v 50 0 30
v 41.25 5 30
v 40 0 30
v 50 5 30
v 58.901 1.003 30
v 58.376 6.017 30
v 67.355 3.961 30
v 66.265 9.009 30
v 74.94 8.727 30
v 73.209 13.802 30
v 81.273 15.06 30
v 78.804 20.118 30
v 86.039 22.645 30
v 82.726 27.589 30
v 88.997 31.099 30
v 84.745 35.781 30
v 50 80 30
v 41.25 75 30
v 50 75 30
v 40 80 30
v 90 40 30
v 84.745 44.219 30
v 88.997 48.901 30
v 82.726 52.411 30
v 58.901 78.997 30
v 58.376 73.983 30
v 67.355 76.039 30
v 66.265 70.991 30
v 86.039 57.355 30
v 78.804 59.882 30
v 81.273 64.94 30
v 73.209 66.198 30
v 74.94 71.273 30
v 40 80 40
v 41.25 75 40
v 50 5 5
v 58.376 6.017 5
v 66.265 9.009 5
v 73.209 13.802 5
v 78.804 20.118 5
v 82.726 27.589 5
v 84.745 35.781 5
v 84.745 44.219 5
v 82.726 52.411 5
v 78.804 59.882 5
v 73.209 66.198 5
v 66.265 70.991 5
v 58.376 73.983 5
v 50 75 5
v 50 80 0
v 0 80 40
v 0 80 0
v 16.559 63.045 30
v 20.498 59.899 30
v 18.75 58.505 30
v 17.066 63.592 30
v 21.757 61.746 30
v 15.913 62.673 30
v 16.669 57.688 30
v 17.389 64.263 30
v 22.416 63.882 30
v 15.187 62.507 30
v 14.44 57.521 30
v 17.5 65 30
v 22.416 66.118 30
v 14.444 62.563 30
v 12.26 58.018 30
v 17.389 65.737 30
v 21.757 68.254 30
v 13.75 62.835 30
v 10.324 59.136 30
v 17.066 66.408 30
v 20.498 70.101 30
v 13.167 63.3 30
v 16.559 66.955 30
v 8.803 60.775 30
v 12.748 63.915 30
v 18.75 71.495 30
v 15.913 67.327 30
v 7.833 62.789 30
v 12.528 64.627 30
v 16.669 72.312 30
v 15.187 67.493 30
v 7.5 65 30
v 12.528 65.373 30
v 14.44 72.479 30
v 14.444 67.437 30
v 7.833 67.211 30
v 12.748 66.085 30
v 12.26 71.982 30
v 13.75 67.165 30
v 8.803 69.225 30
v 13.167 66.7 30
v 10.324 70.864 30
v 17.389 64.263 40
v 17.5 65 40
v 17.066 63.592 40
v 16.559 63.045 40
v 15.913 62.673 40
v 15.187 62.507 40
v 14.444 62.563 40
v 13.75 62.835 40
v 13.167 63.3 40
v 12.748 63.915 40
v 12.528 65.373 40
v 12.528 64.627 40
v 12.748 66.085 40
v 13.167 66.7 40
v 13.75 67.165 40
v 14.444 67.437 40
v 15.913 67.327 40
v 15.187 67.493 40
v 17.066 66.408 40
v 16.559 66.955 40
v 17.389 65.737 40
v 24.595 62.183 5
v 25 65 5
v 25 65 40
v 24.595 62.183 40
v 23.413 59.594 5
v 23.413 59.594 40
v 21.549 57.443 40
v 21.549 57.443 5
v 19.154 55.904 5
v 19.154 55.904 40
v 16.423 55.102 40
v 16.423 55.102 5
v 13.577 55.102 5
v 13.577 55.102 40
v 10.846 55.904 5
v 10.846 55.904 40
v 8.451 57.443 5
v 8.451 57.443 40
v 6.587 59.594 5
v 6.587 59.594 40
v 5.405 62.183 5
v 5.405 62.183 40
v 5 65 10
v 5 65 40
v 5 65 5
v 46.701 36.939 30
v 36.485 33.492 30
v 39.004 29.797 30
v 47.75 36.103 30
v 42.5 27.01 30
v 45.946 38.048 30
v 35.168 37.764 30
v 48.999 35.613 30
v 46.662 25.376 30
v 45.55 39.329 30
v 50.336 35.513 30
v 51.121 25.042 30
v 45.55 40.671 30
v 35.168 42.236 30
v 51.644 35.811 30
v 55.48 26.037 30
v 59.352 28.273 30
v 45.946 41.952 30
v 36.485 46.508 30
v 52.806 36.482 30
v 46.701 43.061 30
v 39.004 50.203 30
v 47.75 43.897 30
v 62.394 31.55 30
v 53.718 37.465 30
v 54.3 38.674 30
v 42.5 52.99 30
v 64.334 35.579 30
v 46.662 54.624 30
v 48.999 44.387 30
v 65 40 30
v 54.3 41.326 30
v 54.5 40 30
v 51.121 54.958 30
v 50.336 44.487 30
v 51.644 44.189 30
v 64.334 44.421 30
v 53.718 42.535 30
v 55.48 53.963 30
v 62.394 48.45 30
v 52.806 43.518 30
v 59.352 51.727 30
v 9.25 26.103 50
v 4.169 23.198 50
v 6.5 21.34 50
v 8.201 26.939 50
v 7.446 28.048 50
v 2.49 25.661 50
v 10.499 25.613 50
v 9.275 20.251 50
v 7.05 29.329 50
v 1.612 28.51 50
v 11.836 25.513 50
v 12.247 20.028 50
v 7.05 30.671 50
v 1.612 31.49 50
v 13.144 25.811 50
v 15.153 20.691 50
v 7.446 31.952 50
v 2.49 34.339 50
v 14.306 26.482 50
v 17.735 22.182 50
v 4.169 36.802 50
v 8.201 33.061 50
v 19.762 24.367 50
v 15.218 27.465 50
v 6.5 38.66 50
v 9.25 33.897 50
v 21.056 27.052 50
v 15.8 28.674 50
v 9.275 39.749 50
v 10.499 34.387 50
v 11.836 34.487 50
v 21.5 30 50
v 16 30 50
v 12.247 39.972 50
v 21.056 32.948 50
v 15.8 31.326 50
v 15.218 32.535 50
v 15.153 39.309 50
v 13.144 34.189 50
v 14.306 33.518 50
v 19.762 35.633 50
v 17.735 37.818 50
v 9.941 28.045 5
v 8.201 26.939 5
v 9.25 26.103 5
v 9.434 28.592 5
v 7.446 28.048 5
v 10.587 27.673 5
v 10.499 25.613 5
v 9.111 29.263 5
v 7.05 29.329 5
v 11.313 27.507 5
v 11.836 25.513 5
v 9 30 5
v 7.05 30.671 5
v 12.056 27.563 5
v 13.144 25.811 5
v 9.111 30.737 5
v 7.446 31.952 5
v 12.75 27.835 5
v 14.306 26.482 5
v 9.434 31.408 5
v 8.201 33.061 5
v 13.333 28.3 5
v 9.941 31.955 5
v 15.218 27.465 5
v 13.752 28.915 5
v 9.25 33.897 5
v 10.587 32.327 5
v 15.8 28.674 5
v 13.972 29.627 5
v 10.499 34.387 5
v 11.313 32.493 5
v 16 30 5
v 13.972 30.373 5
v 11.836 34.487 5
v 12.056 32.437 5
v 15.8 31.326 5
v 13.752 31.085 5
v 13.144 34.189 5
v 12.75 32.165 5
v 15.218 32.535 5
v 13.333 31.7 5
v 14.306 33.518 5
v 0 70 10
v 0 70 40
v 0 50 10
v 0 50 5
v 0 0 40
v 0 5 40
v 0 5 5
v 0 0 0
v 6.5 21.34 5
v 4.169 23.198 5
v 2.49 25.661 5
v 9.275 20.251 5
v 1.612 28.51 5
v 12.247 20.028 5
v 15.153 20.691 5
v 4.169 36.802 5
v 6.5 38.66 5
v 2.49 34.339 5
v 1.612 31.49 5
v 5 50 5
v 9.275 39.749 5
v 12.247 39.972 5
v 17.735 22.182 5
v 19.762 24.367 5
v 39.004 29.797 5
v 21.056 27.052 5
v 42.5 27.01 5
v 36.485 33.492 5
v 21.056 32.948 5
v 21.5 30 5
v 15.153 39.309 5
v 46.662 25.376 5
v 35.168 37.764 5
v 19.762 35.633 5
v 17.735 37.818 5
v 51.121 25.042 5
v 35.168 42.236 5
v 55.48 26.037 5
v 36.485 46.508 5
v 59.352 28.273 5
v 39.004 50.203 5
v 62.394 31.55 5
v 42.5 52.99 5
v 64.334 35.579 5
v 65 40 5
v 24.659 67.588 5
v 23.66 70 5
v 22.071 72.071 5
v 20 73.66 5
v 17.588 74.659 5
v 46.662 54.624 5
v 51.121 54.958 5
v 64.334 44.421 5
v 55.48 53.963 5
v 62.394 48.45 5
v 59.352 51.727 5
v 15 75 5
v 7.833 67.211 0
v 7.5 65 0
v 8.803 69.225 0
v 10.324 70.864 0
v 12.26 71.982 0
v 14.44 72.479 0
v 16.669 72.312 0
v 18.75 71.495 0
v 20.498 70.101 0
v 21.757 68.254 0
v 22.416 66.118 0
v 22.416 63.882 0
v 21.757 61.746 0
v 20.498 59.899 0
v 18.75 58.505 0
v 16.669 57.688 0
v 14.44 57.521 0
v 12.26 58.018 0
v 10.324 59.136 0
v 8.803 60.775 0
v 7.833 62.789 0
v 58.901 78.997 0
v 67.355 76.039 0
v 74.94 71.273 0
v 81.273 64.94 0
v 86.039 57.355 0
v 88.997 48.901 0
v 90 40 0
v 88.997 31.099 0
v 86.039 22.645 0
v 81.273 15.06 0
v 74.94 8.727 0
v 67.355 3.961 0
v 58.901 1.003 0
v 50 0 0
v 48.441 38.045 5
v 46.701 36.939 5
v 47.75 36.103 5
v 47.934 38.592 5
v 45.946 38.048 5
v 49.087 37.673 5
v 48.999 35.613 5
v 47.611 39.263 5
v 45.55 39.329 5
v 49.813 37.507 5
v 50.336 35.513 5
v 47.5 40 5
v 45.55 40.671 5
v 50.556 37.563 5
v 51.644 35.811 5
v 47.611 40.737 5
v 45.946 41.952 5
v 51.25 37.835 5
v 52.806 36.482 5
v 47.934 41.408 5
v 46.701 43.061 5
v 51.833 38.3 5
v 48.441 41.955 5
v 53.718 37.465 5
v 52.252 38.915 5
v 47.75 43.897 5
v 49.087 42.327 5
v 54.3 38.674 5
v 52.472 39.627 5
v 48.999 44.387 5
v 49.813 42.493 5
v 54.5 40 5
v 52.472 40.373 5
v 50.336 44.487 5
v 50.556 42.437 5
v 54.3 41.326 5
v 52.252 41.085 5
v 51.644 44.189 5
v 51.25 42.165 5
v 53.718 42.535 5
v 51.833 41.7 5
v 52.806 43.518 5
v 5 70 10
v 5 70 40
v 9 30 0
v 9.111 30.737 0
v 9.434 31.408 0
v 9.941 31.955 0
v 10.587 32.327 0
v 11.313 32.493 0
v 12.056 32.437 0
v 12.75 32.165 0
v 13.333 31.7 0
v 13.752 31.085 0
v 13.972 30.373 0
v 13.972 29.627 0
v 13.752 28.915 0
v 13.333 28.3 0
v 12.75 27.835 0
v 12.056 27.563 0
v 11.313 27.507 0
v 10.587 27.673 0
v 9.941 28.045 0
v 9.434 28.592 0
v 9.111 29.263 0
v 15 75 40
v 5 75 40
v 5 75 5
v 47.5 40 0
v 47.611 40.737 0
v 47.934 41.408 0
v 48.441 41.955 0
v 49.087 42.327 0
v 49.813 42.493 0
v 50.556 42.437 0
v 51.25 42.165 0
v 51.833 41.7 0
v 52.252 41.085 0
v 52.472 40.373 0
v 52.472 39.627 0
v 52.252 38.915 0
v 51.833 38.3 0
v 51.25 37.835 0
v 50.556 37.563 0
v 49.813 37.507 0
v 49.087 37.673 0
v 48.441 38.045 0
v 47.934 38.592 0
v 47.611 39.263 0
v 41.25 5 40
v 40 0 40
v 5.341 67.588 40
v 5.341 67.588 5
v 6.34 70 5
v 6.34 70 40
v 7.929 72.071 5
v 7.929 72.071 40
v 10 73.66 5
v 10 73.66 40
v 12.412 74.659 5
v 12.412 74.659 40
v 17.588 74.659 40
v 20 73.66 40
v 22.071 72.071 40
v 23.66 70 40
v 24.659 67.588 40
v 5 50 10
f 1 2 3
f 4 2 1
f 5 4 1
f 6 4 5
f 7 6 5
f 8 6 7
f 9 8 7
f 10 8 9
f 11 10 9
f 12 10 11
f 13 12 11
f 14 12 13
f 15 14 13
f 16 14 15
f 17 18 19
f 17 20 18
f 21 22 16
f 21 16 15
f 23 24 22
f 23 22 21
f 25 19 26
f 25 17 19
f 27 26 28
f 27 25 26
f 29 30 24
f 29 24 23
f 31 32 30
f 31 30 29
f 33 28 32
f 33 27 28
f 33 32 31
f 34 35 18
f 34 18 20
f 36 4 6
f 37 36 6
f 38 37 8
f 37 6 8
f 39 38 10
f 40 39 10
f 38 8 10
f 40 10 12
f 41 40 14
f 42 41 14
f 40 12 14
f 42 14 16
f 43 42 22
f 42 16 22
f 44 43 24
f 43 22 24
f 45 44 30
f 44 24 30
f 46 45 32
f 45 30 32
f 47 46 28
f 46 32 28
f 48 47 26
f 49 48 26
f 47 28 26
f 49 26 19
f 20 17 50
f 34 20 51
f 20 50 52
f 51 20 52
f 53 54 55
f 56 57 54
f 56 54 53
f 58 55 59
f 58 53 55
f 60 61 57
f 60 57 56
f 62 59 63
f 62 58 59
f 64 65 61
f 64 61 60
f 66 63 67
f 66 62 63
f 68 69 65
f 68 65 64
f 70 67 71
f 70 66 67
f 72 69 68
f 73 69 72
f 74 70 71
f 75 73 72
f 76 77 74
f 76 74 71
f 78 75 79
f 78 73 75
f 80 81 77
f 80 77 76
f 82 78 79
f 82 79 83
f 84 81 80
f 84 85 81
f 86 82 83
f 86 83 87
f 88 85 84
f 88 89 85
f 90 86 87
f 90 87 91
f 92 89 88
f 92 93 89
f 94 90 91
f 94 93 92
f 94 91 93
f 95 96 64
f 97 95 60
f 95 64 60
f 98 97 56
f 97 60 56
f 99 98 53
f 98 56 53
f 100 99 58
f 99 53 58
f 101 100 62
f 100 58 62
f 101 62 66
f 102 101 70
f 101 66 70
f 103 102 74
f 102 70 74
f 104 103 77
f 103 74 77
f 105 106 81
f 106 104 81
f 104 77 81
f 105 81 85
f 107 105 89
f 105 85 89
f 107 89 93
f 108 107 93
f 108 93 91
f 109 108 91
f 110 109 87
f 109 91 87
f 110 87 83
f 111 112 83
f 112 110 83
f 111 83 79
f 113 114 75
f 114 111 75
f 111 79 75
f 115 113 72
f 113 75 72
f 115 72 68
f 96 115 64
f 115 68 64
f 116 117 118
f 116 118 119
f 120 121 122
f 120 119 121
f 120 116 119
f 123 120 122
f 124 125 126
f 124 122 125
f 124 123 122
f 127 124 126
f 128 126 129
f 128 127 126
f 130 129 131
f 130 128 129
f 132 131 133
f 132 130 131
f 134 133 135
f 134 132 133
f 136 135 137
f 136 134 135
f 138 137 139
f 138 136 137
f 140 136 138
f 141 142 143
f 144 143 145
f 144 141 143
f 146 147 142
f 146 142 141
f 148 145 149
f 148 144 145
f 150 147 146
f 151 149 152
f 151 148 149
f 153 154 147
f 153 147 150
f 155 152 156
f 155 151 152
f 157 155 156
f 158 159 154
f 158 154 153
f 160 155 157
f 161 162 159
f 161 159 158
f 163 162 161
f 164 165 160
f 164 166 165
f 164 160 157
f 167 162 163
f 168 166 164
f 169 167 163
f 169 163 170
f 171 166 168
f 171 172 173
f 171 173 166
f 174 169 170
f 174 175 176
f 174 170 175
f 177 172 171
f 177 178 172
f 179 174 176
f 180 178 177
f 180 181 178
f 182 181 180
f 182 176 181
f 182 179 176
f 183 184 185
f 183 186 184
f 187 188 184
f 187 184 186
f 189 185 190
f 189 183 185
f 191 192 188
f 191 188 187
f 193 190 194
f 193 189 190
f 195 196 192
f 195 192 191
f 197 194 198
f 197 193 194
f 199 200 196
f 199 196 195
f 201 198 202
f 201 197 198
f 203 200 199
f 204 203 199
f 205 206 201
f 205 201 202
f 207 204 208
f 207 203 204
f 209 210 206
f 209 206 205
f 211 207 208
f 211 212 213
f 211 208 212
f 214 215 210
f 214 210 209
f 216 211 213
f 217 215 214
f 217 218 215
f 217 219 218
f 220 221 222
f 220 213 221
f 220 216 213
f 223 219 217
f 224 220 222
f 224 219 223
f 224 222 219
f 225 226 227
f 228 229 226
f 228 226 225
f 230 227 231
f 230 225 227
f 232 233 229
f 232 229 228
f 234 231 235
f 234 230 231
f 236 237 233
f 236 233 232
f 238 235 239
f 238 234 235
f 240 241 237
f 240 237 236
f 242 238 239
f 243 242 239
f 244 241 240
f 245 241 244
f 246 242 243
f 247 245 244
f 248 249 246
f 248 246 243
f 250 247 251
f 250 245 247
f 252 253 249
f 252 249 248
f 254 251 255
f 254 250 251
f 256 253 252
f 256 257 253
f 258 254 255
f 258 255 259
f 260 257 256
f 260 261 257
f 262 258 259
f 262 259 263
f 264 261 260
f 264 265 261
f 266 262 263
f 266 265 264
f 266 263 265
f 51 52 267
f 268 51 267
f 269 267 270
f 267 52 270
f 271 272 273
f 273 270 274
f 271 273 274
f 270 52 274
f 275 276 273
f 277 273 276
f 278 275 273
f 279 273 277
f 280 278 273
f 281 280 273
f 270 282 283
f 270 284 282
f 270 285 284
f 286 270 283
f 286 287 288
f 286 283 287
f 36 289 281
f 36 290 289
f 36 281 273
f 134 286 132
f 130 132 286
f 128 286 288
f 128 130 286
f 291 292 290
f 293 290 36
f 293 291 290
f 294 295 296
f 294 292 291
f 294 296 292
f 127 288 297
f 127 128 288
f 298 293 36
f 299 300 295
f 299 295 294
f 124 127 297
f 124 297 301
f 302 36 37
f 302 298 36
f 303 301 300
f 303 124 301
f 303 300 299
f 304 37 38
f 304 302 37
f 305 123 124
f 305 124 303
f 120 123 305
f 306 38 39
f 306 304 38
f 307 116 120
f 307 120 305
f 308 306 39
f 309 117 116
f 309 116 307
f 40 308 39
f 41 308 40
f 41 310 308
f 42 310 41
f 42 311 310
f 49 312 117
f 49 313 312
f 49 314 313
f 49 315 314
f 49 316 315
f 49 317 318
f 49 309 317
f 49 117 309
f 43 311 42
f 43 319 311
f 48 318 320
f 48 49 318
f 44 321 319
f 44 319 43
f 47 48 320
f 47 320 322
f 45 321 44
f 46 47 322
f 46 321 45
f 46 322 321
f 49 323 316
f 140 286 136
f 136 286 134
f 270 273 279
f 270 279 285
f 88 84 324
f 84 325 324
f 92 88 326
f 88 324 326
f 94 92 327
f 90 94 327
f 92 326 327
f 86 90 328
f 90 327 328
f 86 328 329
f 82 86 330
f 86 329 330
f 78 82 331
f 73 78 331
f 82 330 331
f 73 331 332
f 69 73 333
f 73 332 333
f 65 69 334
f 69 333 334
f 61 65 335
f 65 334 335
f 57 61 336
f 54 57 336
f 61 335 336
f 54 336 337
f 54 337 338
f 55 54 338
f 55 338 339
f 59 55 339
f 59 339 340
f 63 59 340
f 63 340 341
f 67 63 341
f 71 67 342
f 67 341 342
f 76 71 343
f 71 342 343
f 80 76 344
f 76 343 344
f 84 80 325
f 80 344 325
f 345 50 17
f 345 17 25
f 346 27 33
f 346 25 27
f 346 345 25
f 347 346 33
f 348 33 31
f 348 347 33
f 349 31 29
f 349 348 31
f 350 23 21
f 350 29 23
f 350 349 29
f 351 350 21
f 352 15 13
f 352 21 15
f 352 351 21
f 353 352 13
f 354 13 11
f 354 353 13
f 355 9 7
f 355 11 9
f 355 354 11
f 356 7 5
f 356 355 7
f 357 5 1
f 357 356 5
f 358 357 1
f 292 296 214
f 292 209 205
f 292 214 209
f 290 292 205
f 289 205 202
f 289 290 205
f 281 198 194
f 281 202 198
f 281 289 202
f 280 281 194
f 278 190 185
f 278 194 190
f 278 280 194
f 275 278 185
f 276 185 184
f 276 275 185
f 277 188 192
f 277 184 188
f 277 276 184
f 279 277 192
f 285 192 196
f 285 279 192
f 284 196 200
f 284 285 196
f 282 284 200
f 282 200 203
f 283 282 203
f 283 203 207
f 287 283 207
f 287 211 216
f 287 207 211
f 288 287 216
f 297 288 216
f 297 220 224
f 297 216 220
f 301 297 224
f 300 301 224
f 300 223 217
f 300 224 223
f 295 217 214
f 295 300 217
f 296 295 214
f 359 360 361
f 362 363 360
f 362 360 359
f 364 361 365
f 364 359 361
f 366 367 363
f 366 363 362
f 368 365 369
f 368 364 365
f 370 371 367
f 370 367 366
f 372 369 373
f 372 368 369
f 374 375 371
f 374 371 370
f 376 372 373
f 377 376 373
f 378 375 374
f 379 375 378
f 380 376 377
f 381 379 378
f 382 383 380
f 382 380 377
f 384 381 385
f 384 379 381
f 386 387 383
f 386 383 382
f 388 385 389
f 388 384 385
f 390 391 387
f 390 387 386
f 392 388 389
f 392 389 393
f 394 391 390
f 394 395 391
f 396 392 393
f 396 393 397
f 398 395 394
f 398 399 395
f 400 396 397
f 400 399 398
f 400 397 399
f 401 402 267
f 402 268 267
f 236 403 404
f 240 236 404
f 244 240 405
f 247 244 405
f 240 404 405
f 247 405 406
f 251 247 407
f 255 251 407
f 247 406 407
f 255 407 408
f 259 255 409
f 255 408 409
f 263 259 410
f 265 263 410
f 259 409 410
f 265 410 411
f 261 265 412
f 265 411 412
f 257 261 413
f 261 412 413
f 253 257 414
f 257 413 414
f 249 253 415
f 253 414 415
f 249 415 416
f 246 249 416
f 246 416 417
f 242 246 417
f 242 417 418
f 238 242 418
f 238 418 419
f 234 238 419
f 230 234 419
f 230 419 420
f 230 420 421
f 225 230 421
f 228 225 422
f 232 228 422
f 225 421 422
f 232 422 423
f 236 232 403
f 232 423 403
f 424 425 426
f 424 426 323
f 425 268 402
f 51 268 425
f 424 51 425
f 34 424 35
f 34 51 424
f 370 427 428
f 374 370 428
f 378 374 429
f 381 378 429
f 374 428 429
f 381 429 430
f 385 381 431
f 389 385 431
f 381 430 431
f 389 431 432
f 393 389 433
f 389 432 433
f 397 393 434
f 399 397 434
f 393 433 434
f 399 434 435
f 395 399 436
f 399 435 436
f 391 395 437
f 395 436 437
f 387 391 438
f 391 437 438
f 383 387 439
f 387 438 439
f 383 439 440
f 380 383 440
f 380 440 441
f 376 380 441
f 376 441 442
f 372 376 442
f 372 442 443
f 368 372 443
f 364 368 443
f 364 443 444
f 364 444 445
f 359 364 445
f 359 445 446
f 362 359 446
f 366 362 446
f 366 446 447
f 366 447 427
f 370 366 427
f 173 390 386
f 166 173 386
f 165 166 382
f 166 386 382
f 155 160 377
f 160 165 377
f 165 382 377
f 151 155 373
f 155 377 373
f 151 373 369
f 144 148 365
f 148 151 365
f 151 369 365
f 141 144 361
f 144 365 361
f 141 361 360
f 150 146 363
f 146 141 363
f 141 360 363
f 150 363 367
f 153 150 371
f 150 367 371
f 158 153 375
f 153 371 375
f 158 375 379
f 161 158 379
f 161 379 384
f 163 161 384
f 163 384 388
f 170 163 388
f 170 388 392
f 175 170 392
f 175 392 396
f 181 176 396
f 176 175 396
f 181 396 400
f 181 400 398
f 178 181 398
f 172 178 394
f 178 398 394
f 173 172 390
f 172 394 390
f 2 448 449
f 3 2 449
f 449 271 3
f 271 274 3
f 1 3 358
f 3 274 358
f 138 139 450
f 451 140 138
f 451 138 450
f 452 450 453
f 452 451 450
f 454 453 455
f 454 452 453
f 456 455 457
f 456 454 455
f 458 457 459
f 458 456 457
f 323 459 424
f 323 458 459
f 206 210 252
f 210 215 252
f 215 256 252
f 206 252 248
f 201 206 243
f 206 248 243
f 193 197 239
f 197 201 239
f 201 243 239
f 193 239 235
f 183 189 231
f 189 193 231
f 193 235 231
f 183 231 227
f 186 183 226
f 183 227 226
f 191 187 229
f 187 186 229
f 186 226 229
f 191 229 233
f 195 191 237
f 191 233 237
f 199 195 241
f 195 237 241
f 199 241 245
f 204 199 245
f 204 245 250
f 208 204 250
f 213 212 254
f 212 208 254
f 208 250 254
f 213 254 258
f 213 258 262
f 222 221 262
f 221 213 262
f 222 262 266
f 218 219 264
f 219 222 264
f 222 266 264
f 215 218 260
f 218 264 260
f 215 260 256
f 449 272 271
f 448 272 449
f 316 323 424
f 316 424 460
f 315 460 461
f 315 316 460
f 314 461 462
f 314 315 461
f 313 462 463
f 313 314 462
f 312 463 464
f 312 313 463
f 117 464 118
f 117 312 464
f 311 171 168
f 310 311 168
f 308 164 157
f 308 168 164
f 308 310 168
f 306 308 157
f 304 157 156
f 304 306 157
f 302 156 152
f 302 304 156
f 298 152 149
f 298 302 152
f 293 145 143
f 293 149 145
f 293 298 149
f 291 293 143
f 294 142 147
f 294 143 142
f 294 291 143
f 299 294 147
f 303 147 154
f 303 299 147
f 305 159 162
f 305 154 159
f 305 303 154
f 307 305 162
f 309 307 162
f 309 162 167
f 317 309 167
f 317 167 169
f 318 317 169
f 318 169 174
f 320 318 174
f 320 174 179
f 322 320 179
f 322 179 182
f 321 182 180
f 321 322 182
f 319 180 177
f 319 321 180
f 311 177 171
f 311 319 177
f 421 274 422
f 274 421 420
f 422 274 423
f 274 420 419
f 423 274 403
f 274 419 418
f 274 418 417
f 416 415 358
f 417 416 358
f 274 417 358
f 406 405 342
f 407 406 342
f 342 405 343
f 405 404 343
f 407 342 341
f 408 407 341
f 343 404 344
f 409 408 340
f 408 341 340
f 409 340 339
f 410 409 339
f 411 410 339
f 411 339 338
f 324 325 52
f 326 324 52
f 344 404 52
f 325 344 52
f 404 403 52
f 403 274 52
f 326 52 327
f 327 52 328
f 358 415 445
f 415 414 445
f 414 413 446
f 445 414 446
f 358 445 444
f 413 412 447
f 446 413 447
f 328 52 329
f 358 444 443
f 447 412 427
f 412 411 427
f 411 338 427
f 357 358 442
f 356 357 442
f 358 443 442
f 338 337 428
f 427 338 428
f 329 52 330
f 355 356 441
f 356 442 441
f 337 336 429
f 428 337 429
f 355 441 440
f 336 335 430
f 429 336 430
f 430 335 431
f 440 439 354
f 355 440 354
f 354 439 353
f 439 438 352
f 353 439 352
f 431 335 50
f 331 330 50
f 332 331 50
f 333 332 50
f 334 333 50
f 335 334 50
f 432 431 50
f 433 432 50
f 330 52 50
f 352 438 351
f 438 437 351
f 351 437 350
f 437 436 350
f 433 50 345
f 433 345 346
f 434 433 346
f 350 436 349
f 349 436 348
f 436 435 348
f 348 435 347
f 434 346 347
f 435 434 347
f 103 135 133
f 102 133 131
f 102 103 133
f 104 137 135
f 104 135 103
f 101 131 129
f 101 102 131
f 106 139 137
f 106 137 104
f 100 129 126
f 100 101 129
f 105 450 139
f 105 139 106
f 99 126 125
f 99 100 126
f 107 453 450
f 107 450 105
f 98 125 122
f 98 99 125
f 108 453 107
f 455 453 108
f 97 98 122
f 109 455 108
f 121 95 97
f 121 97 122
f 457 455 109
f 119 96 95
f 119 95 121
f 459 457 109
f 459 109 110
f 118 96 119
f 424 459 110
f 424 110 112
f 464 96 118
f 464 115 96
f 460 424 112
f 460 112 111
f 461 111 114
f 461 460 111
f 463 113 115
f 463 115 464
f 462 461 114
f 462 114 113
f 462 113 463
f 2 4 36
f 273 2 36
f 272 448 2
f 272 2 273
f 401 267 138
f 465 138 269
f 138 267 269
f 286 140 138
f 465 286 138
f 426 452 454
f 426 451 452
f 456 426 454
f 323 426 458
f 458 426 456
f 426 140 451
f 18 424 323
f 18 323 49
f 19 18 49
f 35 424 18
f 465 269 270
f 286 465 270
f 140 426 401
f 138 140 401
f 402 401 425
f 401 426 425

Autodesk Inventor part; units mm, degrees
ref_plane "YZ Plane" through (0, 0, 0) normal (1, 0, 0) x (0, 1, 0)
ref_plane "XZ Plane" through (0, 0, 0) normal (0, 1, 0) x (-1, 0, 0)
ref_plane "XY Plane" through (0, 0, 0) normal (0, 0, 1) x (1, 0, 0)
sketch "Sketch1" plane through (0, 0, 0) normal (0, 0, 1) x (1, 0, 0)
  line L0 (0, 0) -> (50, 0)
  line L1 (50, 0) -> (50, 80) construction
  line L2 (50, 80) -> (0, 80)
  line L3 (0, 80) -> (0, 0)
  circle A0 centre (50, 40) radius 40 construction
  arc A1 (50, 0) -> (50, 80) centre (50, 40) ccw
  dimension "d0" = 50
  dimension "d1" = 80
  dimension "d2" = 80
extrude "Extrusion1" add sketch "Sketch1" along normal blind 40
sketch "Sketch2" plane through (0, 0, 40) normal (0, 0, 1) x (1, 0, 0)
  line L0 (50, 80) -> (0, 80) projected
  arc A0 (50, 0) -> (50, 80) centre (50, 40) ccw projected
  line L1 (0, 0) -> (50, 0) projected
  line L2 (0, 75) -> (50, 75)
  arc A1 (50, 5) -> (50, 75) centre (50, 40) ccw
  line L3 (50, 5) -> (0, 5)
  line L4 (0, 75) -> (0, 5)
  line L5 (0, 80) -> (0, 0) projected
  dimension "d5" = 5
extrude "Extrusion2" cut sketch "Sketch2" against normal blind 35 contours L2 A1 L3 L4
sketch "Sketch3" plane through (0, 0, 0) normal (-1, 0, 0) x (0, 0, 1)
  line L0 (0, 80) -> (0, 0) projected
  line L1 (40, 75) -> (40, 5) projected
  line L2 (0, 80) -> (40, 80)
  line L3 (40, 80) -> (40, 70)
  line L4 (40, 70) -> (0, 70)
  line L5 (0, 70) -> (0, 80)
  line L6 (0, 80) -> (10, 80)
  line L7 (10, 80) -> (10, 50)
  line L8 (10, 50) -> (0, 50)
  line L9 (0, 50) -> (0, 80)
  line L10 (0, 0) -> (40, 0) projected
  dimension "d8" = 10
  dimension "d9" = 10
  dimension "d10" = 50
extrude "Extrusion3" add sketch "Sketch3" against normal blind 5
sketch "Sketch4" plane through (0, 0, 40) normal (0, 0, 1) x (1, 0, 0)
  line L0 (50, 80) -> (50, 0)
  arc A0 (50, 0) -> (50, 80) centre (50, 40) ccw projected
  arc A1 (50, 0) -> (50, 80) centre (50, 40) ccw projected
  arc A2 (50, 0) -> (50, 80) centre (50, 40) ccw
  line L1 (50, 40) -> (40, 80)
  line L2 (50, 80) -> (0, 80) projected
  line L3 (40, 80) -> (50, 80)
  line L4 (50, 40) -> (40, 0)
  line L5 (0, 0) -> (50, 0) projected
  line L6 (40, 0) -> (50, 0)
  dimension "d15" = 10
extrude "Extrusion4" cut sketch "Sketch4" against normal blind 10
sketch "Sketch5" plane through (0, 0, 5) normal (0, 0, 1) x (1, 0, 0)
  circle A0 centre (11.5, 30) radius 10
  circle A1 centre (11.5, 30) radius 4.5
  line L0 (0, 0) -> (40, 0) projected
  line L1 (0, 5) -> (0, 50) projected
  dimension "d16" = 20
  dimension "d17" = 9
  dimension "d18" = 30
  dimension "d19" = 11.5
extrude "Extrusion5" add sketch "Sketch5" along normal blind 45
sketch "Sketch6" plane through (0, 0, 5) normal (0, 0, 1) x (1, 0, 0)
  circle A0 centre (50, 40) radius 15
  circle A1 centre (50, 40) radius 4.5
  line L0 (0, 5) -> (0, 50) projected
  line L1 (0, 0) -> (40, 0) projected
  dimension "d22" = 30
  dimension "d23" = 9
  dimension "d24" = 50
  dimension "d25" = 40
extrude "Extrusion6" add sketch "Sketch6" along normal blind 25
sketch "Sketch7" plane through (0, 0, 5) normal (0, 0, 1) x (1, 0, 0)
  circle A0 centre (15, 65) radius 10
  circle A1 centre (15, 65) radius 2.5
  line L0 (5, 75) -> (41.25, 75) projected
  line L1 (5, 70) -> (5, 50) projected
  point P0 (0, 0)
  dimension "d28" = 20
  dimension "d29" = 5
extrude "Extrusion7" add sketch "Sketch7" along normal blind 35
sketch "Sketch9" plane through (0, 0, 0) normal (0, 0, -1) x (-1, 0, 0)
  arc A0 (-15, 75) -> (-5, 65) centre (-15, 65) ccw projected
  arc A1 (-5, 65) -> (-15, 75) centre (-15, 65) ccw projected
  circle A2 centre (-15, 65) radius 2.5 projected
  circle A3 centre (-15, 65) radius 2.5 projected
  circle A4 centre (-15, 65) radius 7.5
  point P0 (0, 0)
  dimension "d34" = 15
extrude "Extrusion9" cut sketch "Sketch9" against normal blind 30 contours A2 | A4
sketch "Sketch10" plane through (0, 0, 0) normal (0, 0, -1) x (-1, 0, 0)
  circle A0 centre (-50, 40) radius 15 projected
  circle A1 centre (-11.5, 30) radius 10 projected
  circle A2 centre (-50, 40) radius 2.5
  circle A3 centre (-11.5, 30) radius 10 projected
  circle A4 centre (-11.5, 30) radius 2.5
  point P0 (0, 0)
  dimension "d37" = 5
  dimension "d38" = 5
extrude "Extrusion10" cut sketch "Sketch10" against normal through all contours A2 | A4
properties part number "FA004" material "ABS Plastic"
